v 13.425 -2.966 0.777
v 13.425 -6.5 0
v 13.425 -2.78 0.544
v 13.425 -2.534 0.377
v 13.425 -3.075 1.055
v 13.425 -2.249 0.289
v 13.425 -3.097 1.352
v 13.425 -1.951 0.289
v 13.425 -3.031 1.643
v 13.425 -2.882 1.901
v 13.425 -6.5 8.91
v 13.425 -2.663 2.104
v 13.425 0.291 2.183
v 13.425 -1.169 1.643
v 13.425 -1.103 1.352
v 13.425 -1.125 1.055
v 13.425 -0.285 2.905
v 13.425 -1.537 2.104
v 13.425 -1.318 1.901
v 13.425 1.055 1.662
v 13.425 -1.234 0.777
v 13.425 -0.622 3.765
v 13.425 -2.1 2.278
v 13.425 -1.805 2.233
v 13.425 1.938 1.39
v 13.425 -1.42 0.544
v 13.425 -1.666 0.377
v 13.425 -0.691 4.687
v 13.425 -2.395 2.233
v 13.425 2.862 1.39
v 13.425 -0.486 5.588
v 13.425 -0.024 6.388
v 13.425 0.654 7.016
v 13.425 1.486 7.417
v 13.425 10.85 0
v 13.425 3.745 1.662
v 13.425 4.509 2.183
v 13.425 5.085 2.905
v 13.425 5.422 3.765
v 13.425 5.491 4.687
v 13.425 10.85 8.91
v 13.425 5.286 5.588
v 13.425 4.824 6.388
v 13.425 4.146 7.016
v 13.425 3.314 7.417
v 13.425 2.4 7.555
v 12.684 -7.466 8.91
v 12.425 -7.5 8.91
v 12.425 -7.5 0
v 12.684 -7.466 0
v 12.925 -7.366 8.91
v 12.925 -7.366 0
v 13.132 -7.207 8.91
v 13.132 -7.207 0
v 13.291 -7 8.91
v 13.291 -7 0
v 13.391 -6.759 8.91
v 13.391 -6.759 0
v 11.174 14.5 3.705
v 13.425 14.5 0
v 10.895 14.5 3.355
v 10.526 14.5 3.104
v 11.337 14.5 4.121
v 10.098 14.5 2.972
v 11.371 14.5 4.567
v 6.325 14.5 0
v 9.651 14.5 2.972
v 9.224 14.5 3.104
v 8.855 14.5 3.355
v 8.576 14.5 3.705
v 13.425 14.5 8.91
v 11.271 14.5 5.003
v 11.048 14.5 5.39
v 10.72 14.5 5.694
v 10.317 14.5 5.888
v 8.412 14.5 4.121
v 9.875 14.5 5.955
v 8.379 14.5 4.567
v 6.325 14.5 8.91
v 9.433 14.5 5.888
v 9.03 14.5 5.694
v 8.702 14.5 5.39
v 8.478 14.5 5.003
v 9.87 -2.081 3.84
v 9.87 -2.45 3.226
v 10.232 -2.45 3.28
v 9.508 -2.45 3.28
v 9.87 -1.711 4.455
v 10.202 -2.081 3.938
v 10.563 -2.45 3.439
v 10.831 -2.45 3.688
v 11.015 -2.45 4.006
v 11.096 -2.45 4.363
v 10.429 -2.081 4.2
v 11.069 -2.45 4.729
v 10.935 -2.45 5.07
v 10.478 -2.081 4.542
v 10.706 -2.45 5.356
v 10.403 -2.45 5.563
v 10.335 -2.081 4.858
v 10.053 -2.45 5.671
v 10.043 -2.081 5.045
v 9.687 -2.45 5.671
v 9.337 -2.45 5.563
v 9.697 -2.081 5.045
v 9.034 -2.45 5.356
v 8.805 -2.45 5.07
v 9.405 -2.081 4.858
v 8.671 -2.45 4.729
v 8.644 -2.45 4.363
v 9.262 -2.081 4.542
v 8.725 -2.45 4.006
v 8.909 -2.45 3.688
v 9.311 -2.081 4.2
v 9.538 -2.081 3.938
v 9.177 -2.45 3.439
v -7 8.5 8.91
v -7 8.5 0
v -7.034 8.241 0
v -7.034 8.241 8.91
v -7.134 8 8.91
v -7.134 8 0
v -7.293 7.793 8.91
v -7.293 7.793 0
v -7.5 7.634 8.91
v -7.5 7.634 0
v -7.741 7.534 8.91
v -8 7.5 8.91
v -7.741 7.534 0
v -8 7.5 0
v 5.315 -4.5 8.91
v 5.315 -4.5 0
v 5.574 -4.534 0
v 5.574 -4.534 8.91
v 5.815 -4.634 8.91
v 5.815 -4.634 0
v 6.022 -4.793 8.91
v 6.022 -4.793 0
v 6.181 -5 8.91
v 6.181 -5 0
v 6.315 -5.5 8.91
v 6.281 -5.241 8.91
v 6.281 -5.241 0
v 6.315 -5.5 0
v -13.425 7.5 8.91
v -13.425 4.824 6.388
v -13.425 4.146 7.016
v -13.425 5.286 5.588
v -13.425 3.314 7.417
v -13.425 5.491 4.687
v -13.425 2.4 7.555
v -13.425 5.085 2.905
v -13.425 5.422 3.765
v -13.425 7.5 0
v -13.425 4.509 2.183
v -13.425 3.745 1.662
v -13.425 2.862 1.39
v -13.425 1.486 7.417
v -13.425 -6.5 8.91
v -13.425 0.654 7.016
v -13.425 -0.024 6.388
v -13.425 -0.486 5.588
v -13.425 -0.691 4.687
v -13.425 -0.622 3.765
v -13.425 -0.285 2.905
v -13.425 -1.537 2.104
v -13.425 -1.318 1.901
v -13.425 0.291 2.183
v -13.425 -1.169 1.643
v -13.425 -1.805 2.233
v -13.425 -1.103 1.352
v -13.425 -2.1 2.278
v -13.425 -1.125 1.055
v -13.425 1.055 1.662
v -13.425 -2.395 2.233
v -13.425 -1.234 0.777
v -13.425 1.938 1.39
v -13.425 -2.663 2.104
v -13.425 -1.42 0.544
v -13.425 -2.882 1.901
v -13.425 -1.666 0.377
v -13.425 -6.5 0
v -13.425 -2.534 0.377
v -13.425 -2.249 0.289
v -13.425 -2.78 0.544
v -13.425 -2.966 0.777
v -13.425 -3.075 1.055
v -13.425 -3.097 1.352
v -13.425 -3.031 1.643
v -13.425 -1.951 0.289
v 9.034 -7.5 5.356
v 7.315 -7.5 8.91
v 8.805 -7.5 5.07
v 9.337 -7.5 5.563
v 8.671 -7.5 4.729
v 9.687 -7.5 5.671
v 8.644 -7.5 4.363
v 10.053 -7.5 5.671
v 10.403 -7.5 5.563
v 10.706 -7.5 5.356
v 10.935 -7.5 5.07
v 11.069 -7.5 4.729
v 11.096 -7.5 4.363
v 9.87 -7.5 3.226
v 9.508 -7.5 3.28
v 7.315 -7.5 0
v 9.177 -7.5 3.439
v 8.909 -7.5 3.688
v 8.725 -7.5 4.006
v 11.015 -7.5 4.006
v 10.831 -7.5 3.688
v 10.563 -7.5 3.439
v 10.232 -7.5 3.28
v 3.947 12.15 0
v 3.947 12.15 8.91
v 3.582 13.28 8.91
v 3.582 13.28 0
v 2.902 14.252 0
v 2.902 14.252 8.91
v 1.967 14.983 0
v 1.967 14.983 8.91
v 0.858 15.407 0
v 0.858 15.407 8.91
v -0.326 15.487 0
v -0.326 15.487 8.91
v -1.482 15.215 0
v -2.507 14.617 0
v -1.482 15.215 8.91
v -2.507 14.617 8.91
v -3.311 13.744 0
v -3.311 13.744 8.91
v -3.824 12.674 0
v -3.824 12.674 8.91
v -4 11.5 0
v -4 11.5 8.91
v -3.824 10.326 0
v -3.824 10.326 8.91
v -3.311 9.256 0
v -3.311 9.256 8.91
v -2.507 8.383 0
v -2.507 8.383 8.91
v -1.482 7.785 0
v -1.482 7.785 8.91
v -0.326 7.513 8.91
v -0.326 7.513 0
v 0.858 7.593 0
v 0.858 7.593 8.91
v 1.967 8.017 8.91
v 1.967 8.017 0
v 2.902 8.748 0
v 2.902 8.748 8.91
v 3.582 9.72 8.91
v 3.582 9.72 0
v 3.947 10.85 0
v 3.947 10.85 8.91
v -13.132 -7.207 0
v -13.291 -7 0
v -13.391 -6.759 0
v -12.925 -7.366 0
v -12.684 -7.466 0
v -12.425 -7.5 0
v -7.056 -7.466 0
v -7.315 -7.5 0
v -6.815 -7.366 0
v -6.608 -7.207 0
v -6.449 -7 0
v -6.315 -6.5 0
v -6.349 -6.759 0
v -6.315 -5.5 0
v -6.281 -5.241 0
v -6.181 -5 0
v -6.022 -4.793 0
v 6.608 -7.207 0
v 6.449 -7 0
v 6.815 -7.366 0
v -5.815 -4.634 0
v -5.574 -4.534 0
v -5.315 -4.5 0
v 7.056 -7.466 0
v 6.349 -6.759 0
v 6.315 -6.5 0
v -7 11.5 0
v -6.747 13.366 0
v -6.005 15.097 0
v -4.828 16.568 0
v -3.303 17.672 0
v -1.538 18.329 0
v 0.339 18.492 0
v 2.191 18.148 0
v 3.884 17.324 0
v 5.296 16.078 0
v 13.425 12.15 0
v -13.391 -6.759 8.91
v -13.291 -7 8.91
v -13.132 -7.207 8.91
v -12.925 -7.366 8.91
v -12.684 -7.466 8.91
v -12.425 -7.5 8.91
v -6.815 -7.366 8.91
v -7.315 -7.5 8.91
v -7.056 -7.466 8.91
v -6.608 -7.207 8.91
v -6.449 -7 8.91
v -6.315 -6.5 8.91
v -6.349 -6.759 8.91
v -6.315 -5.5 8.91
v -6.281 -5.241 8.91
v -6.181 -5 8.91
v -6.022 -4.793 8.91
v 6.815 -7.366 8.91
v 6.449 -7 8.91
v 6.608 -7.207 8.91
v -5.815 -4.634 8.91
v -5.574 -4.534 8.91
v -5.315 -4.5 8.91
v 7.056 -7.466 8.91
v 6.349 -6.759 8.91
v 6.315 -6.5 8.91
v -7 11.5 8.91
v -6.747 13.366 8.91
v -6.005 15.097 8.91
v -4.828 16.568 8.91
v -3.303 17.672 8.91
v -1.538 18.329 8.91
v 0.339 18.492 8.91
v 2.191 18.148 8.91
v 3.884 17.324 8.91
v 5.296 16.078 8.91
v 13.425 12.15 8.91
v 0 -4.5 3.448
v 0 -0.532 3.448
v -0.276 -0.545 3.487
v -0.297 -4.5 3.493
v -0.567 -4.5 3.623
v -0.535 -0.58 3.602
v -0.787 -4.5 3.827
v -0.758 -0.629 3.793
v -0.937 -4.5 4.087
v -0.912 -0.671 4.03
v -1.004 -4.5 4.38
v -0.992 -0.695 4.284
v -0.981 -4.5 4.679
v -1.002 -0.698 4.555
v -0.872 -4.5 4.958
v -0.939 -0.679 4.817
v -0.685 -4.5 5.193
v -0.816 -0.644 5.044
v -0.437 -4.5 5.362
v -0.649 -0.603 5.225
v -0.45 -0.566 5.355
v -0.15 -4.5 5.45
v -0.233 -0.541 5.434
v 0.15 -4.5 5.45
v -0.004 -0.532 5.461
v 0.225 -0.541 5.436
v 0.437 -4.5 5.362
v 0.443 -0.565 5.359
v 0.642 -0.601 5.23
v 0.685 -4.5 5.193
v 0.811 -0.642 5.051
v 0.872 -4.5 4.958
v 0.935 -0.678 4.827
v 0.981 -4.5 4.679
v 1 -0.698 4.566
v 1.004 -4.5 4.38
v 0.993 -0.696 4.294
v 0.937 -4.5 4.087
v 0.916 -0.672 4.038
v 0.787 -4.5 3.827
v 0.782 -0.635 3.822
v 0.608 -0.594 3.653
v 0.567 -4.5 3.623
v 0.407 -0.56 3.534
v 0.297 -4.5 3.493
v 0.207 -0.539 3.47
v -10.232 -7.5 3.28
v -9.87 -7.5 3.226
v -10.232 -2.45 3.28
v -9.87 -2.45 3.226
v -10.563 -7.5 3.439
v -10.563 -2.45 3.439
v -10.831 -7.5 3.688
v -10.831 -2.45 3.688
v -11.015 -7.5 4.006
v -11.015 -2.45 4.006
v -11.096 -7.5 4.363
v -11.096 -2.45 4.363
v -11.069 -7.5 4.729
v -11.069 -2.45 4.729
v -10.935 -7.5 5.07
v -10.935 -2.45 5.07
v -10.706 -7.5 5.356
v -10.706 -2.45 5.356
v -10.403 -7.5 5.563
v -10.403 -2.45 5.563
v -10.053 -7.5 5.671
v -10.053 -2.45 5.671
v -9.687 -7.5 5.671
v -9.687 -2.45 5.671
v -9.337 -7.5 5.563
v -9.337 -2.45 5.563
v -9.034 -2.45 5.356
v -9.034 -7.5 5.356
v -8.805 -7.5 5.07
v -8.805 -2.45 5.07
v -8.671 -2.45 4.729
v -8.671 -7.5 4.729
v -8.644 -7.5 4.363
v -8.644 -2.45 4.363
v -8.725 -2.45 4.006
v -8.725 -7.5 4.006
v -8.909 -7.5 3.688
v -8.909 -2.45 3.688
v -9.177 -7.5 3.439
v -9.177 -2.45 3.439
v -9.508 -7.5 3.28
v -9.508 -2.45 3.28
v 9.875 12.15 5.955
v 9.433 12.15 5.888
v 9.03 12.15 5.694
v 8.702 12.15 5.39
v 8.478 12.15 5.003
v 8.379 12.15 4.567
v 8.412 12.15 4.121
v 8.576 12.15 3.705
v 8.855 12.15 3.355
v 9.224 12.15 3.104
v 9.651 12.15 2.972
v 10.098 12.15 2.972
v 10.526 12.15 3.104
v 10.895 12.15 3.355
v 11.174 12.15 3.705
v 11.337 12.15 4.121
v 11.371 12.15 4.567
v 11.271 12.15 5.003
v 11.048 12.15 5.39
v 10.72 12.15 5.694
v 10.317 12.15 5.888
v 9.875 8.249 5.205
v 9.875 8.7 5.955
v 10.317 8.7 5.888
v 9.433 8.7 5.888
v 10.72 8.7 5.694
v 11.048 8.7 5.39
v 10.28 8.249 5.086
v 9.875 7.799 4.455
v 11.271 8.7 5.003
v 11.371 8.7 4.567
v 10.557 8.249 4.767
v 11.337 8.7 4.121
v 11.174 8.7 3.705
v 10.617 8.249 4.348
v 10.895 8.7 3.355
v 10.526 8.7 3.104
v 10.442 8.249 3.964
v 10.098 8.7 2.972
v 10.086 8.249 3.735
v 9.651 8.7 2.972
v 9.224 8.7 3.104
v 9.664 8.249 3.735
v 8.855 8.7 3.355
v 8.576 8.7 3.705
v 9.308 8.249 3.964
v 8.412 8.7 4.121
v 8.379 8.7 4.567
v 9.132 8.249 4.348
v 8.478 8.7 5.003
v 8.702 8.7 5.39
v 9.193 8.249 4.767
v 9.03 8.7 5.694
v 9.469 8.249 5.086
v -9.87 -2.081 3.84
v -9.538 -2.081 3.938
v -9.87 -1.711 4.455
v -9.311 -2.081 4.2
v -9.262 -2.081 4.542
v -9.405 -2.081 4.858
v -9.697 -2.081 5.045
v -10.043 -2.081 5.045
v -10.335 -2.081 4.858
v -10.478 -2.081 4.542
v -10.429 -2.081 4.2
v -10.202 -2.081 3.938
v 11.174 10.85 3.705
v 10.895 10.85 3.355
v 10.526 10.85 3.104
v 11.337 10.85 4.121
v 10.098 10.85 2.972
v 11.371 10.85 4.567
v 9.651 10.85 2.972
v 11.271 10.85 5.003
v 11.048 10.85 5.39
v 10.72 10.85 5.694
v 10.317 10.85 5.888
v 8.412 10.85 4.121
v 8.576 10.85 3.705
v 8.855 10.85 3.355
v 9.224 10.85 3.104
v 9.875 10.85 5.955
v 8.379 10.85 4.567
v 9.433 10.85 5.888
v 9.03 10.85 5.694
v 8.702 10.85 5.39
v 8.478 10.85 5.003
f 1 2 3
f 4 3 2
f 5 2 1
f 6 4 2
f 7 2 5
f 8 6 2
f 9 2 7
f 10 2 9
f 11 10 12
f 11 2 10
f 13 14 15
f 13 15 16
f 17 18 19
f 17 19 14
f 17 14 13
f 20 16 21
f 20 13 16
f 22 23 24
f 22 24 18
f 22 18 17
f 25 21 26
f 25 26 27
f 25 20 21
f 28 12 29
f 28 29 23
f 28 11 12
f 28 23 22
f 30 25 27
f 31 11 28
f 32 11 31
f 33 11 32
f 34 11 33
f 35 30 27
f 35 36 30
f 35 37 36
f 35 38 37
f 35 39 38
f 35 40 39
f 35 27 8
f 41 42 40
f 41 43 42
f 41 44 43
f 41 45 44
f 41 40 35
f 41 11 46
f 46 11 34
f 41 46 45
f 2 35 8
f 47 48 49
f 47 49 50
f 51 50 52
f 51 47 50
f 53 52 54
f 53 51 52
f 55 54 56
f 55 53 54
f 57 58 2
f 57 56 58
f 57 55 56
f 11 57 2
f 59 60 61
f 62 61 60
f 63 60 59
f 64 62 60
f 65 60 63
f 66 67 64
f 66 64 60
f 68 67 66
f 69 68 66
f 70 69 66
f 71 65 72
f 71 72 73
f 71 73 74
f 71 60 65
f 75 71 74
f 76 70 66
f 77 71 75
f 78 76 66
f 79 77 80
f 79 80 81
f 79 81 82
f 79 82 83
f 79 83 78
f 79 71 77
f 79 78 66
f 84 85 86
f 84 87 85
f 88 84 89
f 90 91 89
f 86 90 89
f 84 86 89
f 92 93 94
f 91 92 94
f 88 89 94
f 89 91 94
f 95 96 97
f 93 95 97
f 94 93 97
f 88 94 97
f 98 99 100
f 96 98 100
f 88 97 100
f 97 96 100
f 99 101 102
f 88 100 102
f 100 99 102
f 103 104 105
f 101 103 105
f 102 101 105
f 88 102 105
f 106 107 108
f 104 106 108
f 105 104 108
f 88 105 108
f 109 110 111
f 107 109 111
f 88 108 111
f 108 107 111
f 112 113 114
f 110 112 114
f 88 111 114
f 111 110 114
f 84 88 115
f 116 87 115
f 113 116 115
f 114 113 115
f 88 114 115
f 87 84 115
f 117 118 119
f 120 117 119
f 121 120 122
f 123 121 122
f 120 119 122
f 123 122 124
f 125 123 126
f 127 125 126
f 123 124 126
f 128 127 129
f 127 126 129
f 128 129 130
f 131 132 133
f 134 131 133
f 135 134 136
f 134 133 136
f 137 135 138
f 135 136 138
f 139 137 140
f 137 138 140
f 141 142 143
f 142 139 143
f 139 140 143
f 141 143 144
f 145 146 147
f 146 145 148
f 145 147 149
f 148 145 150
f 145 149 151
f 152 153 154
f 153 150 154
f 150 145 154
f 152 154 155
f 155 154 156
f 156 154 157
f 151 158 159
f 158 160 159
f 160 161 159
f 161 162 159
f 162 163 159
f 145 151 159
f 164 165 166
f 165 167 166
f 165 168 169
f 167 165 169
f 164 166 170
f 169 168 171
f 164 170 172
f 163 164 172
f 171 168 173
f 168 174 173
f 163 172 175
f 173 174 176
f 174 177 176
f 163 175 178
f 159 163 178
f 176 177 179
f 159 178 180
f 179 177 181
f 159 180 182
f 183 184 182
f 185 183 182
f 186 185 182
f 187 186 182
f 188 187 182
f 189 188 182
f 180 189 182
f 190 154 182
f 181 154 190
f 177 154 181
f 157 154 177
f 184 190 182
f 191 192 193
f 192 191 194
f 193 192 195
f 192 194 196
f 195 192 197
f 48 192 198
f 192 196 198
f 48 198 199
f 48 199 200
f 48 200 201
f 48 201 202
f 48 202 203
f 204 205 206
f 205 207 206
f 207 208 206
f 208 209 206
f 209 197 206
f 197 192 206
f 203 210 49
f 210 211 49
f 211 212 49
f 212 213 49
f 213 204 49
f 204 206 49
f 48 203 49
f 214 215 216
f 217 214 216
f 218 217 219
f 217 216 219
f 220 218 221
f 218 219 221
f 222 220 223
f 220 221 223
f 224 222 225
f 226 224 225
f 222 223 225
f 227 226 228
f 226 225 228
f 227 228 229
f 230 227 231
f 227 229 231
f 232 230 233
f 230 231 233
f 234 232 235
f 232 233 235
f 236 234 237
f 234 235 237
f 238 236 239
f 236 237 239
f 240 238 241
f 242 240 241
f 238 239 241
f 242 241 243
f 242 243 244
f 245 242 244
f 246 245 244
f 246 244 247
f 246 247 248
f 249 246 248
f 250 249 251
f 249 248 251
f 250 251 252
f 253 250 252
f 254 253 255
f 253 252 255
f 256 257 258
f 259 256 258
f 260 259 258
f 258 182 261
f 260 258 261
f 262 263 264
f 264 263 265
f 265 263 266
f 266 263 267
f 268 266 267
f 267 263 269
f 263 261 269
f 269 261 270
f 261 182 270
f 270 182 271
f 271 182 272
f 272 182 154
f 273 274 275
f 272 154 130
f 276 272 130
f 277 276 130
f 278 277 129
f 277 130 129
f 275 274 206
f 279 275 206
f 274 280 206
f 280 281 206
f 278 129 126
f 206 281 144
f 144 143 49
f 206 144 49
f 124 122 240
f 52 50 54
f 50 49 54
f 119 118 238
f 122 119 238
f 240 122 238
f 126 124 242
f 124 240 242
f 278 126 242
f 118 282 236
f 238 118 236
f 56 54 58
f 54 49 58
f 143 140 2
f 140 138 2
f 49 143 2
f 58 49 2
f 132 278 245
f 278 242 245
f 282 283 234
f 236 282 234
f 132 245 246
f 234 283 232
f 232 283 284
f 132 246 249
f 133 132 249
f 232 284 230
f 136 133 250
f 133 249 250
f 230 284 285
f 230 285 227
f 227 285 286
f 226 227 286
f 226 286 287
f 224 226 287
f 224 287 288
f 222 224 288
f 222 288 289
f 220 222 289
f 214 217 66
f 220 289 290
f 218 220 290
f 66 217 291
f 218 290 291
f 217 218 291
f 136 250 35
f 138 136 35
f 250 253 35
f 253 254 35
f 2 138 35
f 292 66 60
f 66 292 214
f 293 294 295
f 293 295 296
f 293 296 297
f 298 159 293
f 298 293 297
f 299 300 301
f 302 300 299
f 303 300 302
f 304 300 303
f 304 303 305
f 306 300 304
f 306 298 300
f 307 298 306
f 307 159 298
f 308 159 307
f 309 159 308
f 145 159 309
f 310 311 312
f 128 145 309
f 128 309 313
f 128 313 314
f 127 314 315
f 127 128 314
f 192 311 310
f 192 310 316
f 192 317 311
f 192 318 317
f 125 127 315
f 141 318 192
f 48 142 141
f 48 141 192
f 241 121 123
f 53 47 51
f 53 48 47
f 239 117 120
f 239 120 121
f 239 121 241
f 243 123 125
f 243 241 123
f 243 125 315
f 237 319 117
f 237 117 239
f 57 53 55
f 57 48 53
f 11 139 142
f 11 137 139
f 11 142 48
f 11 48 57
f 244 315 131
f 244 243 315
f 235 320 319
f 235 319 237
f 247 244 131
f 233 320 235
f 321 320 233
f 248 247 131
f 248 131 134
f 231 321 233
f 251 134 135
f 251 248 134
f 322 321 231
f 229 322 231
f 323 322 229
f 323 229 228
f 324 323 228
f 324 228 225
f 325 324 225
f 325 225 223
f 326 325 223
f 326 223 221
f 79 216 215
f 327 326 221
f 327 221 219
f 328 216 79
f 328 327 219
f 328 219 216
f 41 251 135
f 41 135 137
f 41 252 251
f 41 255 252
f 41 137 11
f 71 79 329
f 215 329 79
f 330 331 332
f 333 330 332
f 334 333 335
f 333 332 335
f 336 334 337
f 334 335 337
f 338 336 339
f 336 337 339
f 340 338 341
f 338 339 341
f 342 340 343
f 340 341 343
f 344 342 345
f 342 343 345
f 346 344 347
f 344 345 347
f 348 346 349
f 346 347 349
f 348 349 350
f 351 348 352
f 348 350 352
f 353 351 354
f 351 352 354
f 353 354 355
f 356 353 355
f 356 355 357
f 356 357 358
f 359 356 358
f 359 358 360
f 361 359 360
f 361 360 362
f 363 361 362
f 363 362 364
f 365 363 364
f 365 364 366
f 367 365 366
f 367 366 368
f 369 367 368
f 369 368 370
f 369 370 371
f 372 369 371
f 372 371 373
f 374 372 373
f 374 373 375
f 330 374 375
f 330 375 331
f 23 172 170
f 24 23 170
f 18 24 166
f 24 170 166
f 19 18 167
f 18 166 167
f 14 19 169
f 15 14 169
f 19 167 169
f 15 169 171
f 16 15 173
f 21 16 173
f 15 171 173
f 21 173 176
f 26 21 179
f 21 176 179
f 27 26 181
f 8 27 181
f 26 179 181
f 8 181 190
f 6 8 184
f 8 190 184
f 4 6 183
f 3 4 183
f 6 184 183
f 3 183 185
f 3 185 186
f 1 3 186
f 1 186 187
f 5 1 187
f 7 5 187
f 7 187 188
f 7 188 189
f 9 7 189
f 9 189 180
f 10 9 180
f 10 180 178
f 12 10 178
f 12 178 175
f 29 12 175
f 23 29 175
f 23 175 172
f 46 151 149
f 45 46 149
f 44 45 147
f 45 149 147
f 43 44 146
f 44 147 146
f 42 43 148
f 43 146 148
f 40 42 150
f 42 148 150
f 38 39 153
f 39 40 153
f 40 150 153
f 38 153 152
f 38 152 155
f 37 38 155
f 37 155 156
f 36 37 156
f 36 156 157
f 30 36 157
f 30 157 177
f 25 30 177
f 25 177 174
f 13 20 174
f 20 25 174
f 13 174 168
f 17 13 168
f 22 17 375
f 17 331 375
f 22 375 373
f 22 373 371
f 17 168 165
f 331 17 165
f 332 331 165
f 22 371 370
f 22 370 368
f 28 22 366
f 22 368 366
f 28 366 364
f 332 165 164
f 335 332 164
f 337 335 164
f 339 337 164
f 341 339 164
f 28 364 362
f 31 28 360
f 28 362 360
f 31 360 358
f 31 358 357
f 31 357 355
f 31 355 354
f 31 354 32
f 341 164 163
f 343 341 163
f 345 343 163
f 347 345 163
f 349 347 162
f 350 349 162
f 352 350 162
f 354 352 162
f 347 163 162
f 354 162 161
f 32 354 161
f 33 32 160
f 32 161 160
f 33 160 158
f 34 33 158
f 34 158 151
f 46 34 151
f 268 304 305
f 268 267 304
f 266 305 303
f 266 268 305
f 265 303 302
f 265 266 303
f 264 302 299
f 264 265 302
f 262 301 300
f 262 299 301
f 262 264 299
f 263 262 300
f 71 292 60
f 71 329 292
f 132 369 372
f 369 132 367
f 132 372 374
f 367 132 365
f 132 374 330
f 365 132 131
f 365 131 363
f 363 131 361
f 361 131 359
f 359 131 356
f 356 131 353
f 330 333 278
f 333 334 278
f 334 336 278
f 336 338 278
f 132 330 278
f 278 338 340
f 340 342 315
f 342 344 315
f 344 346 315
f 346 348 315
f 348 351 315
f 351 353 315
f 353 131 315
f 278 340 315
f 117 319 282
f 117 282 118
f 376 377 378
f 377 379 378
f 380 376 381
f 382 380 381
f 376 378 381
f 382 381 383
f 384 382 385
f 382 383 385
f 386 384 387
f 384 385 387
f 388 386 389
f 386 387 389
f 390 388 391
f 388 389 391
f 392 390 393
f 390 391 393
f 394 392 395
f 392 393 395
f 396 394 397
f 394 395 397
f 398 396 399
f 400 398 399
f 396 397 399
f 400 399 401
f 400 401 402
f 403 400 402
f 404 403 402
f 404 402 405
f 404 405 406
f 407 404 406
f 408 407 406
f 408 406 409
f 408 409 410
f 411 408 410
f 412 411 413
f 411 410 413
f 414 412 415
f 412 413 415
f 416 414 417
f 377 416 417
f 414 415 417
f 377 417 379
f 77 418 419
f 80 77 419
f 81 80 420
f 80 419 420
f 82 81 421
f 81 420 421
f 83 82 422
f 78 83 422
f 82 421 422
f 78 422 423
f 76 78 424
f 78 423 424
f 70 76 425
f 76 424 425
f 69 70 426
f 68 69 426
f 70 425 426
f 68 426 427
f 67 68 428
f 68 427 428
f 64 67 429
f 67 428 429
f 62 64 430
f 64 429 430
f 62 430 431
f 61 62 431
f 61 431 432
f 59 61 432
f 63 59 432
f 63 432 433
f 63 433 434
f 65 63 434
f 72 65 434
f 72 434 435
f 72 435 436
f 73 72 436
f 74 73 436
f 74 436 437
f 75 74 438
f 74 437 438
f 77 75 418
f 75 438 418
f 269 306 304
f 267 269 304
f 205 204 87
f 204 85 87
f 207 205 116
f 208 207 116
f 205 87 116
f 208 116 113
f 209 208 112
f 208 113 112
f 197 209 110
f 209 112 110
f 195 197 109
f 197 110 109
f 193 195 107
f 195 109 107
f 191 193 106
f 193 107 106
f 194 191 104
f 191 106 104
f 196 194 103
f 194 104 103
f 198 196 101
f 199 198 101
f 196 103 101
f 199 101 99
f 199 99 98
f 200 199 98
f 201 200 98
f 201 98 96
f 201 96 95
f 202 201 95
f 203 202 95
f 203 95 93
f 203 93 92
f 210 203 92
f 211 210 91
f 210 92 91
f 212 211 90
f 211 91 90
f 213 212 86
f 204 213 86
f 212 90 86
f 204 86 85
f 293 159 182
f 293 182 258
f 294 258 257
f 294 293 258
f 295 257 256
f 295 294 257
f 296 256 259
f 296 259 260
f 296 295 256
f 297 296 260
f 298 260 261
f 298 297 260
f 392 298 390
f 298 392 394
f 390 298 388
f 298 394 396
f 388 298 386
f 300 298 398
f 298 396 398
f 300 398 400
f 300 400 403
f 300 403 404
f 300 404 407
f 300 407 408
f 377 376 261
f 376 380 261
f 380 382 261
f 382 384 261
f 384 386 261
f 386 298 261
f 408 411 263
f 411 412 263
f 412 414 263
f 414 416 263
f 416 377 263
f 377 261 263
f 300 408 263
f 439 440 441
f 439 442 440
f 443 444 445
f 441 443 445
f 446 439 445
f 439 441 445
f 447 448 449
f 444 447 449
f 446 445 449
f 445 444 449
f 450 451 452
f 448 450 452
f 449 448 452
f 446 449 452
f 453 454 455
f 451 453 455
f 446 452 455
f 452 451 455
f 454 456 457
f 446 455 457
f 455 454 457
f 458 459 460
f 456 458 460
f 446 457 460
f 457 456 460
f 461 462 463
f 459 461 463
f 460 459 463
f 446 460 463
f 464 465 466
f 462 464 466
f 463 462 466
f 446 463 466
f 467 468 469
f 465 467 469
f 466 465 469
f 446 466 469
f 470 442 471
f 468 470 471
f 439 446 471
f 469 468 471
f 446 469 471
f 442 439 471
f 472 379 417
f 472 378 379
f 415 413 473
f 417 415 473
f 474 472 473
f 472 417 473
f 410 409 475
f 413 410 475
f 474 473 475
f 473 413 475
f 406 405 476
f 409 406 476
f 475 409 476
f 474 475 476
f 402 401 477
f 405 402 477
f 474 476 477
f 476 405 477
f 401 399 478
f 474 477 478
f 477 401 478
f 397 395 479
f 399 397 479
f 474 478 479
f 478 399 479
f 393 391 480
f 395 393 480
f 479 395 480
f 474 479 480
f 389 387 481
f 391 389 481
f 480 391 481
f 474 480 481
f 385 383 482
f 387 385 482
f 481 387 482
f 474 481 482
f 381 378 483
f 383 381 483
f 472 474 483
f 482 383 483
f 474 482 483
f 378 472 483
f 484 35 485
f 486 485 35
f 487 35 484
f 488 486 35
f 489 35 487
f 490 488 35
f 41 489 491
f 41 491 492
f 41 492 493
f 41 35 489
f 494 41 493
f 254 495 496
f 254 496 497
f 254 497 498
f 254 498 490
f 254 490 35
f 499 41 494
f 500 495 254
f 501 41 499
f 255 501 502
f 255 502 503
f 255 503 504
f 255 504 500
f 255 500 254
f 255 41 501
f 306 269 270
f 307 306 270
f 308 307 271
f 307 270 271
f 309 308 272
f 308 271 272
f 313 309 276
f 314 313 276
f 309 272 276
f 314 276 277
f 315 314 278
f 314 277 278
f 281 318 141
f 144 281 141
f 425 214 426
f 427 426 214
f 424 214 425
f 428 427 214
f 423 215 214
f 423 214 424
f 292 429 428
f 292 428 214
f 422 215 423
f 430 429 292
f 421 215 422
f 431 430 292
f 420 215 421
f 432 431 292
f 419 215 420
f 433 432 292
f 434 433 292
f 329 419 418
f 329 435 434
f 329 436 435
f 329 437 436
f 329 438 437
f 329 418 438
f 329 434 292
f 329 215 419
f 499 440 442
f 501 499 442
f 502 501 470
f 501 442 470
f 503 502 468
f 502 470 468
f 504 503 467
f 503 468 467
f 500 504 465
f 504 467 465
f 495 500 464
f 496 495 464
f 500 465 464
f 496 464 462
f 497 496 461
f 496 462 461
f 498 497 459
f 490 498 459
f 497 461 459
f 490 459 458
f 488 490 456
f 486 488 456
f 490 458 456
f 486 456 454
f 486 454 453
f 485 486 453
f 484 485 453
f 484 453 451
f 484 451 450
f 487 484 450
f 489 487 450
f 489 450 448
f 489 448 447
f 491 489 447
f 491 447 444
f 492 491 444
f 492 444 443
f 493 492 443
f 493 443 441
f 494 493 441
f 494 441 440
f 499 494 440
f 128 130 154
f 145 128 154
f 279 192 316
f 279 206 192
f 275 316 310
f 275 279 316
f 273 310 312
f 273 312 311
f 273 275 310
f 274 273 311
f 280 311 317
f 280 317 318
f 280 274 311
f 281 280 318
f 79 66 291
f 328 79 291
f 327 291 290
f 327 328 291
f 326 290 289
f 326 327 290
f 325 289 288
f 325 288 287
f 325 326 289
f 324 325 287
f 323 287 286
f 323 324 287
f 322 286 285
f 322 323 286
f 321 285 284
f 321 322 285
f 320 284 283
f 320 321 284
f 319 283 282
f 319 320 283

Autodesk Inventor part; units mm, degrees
ref_plane "YZ Plane" through (0, 0, 0) normal (1, 0, 0) x (0, 1, 0)
ref_plane "XZ Plane" through (0, 0, 0) normal (0, 1, 0) x (-1, 0, 0)
ref_plane "XY Plane" through (0, 0, 0) normal (0, 0, 1) x (1, 0, 0)
sketch "Sketch1" plane through (0, 0, 0) normal (0, 0, 1) x (1, 0, 0)
  line L0 (-13.425, -7.5) -> (13.425, -7.5)
  line L1 (13.425, -7.5) -> (13.425, 7.5)
  line L2 (13.425, 7.5) -> (-13.425, 7.5)
  line L3 (-13.425, 7.5) -> (-13.425, -7.5)
  line L4 (-13.425, -7.5) -> (13.425, 7.5) construction
  line L5 (13.425, -7.5) -> (-13.425, 7.5) construction
  point P0 (0, 0)
  dimension "d0" = 26.85
  dimension "d1" = 15
extrude "Extrusion1" add sketch "Sketch1" along normal blind 8.91
sketch "Sketch2" plane through (0, 0, 8.91) normal (0, 0, 1) x (1, 0, 0)
  line L0 (-13.425, -7.5) -> (13.425, -7.5) projected
  line L1 (-6.315, -7.5) -> (6.315, -7.5)
  line L2 (6.315, -7.5) -> (6.315, -4.5)
  line L3 (6.315, -4.5) -> (-6.315, -4.5)
  line L4 (-6.315, -4.5) -> (-6.315, -7.5)
  line L5 (-13.425, 7.5) -> (-13.425, -7.5) projected
  line L6 (13.425, -7.5) -> (13.425, 7.5) projected
  point P0 (0, 0)
  dimension "d4" = 7.11
  dimension "d5" = 7.11
  dimension "d6" = 3
extrude "Extrusion2" cut sketch "Sketch2" against normal through all
fillet "Fillet1" radius 1 6 edges at (-6.315, -4.5, 4.455) (6.315, -4.5, 4.455) (6.315, -7.5, 4.455) (-6.315, -7.5, 4.455) (-13.425, -7.5, 4.455) (13.425, -7.5, 4.455)
hole "Hole1" at (-9.87, -7.5, 4.455) direction (0, 1, 0) diameter 2.459 depth 5.05 tip angle 118 thread size "M3x0.5" class "6H" standard "ISO Metric profile"
hole "Hole2" at (9.87, -7.5, 4.455) direction (0, 1, 0) diameter 2.459 depth 5.05 tip angle 118 thread size "M3x0.5" class "6H" standard "ISO Metric profile"
sketch "Sketch3" plane through (-13.425, 7.5, 0) normal (-1, 0, 0) x (0, 0, 1)
  circle A0 centre (4.455, -5.1) radius 3.1
  line L0 (6.8136, -2) -> (2.7173, -2)
  line L1 (0, -15) -> (8.91, -15) projected
  point P0 (0, -7.5)
  point P1 (4.455, -15)
  dimension "d28" = 6.2
  dimension "d29" = 13
extrude "Extrusion3" cut sketch "Sketch3" against normal through all
sketch "Sketch4" plane through (-13.425, 7.5, 0) normal (-1, 0, 0) x (0, 0, 1)
  circle A0 centre (1.2775, -9.6) radius 1
  line L0 (0, -15) -> (8.91, -15) projected
  point P0 (0, -7.5)
  dimension "d32" = 2
  dimension "d33" = 5.4
extrude "Extrusion4" cut sketch "Sketch4" against normal through all
sketch "Sketch5" plane through (0, 0, 8.91) normal (0, 0, 1) x (1, 0, 0)
  line L0 (13.425, 7.5) -> (-13.425, 7.5) projected
  line L1 (-5.315, -4.5) -> (5.315, -4.5) projected
  line L2 (-7, 11.5) -> (-7, 7.5)
  line L3 (13.425, -6.5) -> (13.425, 7.5) projected
  line L4 (13.425, 14.5) -> (6.3246, 14.5)
  line L5 (7, 11.5) -> (13.425, 11.5) construction
  line L6 (7.315, -7.5) -> (12.425, -7.5) projected
  line L7 (13.425, 7.5) -> (13.425, 10.87)
  line L8 (13.425, 12.13) -> (13.425, 14.5)
  arc A0 (6.3246, 14.5) -> (-7, 11.5) centre (0, 11.5) ccw
  line L9 (-7, 7.5) -> (13.425, 7.5)
  line L10 (13.425, 12.13) -> (13.425, 10.87)
  point P0 (0, 0)
  dimension "d40" = 22
extrude "Extrusion5" add sketch "Sketch5" against normal up to surface (8.91 mm away)
sketch "Sketch6" plane through (0, 0, 8.91) normal (0, 0, 1) x (1, 0, 0)
  arc A0 (6.3246, 14.5) -> (-7, 11.5) centre (0, 11.5) ccw projected
  circle A1 centre (0, 11.5) radius 4
  point P0 (0, 0)
  dimension "d43" = 8
extrude "Extrusion6" cut sketch "Sketch6" against normal through all
sketch "Sketch7" plane through (0, 0, 8.91) normal (0, 0, 1) x (1, 0, 0)
  line L0 (2.5936, 12.15) -> (18.1554, 12.15)
  line L1 (18.1554, 12.15) -> (18.1554, 10.85)
  line L2 (18.1554, 10.85) -> (2.5936, 10.85)
  line L3 (2.5936, 10.85) -> (2.5936, 12.15)
  circle A0 centre (0, 11.5) radius 4 construction
  point P0 (0, 0)
  point P1 (2.5936, 11.5)
  dimension "d46" = 1.3
extrude "Extrusion7" cut sketch "Sketch7" against normal through all
fillet "Fillet2" radius 1 1 edges at (-7, 7.5, 4.455)
hole "Hole3" at (9.8748, 14.5, 4.455) direction (0, -1, 0) diameter 3 depth 5.8 tip angle 118
thread "Thread1" size "M3x0.5" class "6H" standard "ANSI Metric M Profile" full length
hole "Hole4" at (0, -4.5, 4.455) direction (0, 1, 0) diameter 2.013 depth 6.35 tip angle 118 thread size "M2.5x0.45" class "6H" standard "ISO Metric profile"
equation "\"d5\" = d4"
properties part number "hotend" material "Aluminum"
